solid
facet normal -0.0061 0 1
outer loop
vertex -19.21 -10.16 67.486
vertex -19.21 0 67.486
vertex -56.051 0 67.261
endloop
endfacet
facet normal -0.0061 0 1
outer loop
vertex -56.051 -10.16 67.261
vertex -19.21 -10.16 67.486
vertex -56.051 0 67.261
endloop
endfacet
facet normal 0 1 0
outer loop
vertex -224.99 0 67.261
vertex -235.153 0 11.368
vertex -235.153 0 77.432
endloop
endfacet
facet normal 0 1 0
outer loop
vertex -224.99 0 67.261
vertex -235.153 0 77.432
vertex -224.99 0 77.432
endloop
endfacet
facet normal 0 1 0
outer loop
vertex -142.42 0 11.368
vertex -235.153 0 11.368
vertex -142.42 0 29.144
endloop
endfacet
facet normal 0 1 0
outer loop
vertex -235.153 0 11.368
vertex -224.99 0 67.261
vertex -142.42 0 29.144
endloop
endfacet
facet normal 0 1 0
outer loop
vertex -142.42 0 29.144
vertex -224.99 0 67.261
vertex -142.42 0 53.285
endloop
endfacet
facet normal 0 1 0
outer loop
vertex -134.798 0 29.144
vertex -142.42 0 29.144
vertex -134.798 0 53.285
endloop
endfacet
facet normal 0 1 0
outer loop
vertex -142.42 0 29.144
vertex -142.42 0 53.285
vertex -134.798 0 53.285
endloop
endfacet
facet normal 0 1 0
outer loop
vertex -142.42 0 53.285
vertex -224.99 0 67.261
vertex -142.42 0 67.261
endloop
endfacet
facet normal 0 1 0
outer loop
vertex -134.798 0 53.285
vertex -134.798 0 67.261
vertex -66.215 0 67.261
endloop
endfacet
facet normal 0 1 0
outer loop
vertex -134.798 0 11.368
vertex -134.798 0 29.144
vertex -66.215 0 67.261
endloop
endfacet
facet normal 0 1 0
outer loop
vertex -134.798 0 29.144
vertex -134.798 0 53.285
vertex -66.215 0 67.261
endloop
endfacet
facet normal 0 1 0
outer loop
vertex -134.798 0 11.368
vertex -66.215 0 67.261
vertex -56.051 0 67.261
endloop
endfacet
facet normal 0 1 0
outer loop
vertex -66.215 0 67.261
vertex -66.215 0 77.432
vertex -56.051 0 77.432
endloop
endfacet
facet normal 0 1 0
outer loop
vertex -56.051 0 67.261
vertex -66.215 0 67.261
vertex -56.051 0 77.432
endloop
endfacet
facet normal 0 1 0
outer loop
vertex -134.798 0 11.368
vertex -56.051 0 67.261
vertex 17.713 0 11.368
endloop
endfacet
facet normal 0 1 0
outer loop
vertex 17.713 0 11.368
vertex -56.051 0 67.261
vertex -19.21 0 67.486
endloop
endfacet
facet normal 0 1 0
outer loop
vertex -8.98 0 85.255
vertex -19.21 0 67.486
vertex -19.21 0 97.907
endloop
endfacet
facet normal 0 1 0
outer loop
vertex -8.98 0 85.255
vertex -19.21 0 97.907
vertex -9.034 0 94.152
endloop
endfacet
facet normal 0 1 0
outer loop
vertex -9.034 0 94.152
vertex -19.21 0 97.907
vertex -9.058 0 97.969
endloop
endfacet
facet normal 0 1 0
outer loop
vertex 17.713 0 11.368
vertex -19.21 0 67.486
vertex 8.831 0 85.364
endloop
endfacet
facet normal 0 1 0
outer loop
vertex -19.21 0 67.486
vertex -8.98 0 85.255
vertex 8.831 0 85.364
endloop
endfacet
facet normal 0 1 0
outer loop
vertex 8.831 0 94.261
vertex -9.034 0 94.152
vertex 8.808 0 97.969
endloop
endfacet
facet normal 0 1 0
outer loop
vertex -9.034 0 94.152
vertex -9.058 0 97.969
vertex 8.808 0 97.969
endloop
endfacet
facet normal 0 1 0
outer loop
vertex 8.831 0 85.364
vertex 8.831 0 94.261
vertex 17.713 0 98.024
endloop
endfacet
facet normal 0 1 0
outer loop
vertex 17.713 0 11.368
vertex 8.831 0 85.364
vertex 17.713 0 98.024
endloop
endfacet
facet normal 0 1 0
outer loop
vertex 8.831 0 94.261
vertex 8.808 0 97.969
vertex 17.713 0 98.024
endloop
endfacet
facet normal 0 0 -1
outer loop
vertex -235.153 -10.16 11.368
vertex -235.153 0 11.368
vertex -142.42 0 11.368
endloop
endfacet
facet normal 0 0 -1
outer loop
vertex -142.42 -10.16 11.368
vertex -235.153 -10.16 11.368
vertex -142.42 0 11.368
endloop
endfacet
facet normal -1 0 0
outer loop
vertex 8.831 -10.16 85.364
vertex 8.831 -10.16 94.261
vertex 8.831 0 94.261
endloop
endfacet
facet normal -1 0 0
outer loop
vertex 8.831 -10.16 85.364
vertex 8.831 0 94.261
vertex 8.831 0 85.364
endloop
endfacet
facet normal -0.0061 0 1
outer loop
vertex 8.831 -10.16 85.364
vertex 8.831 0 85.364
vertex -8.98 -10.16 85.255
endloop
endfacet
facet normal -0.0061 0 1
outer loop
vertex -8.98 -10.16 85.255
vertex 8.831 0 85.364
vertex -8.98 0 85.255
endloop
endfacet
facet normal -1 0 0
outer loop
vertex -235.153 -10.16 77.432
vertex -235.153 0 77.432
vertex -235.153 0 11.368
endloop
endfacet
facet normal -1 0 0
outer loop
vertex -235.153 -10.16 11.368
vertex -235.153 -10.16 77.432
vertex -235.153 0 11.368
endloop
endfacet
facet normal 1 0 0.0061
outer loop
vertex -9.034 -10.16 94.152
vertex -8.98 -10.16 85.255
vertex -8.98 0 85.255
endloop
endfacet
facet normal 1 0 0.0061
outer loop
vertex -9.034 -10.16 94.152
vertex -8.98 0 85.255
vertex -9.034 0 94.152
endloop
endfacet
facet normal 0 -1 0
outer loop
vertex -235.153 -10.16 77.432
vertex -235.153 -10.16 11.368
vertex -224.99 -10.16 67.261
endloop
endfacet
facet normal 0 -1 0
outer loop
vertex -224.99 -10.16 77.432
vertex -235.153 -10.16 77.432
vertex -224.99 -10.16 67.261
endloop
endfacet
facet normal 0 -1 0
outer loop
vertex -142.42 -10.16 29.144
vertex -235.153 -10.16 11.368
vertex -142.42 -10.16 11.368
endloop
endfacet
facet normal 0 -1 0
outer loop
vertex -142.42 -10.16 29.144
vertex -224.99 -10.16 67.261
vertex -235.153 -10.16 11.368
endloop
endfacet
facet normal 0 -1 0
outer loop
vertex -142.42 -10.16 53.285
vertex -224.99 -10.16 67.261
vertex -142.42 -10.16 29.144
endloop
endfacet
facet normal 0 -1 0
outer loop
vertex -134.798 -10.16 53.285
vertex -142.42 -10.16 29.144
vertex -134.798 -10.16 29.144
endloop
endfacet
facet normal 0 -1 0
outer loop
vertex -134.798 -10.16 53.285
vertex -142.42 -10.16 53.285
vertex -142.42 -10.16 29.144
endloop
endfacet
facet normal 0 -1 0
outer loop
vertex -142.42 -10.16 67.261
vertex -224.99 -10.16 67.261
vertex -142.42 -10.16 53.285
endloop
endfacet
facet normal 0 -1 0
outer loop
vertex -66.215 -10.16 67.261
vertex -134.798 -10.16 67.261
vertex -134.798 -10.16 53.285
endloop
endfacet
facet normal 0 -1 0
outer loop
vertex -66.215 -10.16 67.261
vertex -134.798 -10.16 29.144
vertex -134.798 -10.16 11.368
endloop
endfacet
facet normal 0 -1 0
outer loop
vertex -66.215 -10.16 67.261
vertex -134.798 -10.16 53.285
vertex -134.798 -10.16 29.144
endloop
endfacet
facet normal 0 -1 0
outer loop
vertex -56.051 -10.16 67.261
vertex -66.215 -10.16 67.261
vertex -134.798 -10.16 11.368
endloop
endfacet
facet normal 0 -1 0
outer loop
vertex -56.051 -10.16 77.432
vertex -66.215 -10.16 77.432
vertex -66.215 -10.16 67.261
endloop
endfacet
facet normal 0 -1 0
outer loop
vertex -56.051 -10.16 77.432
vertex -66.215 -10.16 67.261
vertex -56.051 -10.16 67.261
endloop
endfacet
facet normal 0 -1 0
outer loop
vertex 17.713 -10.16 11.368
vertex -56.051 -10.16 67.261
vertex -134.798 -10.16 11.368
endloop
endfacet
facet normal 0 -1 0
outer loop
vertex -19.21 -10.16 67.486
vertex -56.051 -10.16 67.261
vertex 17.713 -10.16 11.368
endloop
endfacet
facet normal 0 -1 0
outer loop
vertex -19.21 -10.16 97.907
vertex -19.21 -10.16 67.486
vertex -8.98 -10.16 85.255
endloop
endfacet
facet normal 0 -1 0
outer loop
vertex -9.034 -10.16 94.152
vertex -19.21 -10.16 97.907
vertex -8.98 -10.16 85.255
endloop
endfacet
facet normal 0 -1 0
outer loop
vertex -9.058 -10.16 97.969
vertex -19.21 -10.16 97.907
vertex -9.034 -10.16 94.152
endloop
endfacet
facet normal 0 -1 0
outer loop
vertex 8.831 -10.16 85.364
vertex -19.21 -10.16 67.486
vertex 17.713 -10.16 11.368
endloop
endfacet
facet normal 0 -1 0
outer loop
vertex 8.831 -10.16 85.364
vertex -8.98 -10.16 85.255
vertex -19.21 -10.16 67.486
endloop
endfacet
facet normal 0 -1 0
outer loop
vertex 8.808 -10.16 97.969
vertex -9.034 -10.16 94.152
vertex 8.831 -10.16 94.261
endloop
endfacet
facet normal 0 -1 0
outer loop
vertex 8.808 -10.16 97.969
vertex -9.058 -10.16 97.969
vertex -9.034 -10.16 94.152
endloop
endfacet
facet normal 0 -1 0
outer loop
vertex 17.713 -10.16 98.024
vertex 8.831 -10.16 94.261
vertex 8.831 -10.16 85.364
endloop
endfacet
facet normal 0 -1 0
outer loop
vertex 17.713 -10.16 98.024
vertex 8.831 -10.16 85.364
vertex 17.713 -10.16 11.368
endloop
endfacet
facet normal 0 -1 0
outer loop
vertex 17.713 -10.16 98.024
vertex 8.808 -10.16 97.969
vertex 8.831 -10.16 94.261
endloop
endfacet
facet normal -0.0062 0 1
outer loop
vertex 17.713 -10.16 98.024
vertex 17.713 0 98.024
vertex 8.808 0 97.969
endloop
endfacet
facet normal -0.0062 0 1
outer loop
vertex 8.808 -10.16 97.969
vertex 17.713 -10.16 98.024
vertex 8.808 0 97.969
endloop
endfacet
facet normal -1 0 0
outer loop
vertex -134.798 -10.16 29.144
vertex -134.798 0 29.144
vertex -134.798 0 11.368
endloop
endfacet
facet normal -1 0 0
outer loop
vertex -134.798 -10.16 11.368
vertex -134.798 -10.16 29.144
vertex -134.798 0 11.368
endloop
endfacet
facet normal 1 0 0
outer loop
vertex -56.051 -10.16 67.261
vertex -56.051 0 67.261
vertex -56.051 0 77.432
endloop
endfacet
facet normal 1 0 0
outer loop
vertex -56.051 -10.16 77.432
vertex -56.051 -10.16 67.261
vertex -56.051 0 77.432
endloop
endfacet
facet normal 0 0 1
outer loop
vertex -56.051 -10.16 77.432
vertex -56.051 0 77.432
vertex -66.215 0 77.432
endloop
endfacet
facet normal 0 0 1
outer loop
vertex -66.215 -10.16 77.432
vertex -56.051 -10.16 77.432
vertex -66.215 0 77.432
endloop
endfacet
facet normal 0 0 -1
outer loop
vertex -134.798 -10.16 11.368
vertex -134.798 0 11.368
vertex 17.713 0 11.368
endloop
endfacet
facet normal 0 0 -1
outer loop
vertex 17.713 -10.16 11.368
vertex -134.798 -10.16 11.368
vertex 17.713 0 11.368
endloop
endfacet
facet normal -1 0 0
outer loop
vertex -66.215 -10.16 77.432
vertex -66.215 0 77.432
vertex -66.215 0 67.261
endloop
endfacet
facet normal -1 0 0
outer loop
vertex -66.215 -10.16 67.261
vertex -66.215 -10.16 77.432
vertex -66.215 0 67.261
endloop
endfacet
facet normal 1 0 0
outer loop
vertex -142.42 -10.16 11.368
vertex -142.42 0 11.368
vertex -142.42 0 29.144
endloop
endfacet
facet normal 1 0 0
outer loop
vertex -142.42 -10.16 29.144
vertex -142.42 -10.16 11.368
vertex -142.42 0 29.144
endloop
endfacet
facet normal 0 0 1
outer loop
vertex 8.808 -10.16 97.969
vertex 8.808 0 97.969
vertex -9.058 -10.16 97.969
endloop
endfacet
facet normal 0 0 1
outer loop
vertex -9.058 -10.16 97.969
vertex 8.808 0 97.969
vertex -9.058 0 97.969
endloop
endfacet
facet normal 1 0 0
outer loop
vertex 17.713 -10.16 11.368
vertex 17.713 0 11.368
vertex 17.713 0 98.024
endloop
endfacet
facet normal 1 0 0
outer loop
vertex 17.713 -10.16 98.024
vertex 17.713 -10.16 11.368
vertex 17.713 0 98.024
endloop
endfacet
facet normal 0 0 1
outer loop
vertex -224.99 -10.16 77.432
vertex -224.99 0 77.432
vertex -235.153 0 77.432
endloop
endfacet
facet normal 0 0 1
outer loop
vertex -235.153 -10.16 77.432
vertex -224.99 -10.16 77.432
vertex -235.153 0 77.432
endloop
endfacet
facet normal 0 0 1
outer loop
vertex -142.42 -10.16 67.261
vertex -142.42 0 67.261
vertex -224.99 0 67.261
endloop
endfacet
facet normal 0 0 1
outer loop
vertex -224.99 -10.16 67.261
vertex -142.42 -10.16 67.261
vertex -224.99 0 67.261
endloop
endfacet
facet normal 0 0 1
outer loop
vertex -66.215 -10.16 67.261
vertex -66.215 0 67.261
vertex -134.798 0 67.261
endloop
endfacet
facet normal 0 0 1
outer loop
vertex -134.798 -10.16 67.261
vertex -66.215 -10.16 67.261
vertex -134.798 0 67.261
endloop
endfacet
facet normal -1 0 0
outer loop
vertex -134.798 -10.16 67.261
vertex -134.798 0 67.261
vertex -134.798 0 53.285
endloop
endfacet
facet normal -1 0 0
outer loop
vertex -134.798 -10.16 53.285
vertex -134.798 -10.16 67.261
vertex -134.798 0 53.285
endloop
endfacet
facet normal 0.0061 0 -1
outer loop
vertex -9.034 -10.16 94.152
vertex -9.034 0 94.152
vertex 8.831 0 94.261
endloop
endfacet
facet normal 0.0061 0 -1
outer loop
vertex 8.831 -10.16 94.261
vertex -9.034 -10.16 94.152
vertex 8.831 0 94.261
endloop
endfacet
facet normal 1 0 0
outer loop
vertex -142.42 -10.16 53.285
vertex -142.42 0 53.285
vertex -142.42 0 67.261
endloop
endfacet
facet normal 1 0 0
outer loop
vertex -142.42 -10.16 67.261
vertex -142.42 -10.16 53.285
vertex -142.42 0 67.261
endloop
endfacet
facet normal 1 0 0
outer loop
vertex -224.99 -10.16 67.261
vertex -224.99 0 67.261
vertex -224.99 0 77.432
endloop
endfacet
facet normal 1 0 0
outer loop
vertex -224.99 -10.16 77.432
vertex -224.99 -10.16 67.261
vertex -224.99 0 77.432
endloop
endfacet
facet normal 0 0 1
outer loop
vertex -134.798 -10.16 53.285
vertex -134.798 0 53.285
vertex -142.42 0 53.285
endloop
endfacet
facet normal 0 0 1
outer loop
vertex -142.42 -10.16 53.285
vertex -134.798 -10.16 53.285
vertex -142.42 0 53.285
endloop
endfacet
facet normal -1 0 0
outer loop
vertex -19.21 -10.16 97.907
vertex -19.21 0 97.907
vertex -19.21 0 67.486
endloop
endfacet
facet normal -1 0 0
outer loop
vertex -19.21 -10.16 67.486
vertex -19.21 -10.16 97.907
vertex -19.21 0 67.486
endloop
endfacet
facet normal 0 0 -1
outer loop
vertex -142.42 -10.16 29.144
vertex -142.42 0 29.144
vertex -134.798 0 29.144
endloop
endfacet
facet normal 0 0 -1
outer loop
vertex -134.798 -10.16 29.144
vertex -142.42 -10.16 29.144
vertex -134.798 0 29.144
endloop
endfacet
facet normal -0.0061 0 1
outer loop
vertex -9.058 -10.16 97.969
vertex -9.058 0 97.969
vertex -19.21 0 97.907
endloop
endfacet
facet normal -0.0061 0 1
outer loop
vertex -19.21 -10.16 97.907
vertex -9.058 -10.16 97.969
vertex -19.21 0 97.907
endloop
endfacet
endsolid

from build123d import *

# Parameters (mm, degrees)
F1_DEPTH = 10.16


with BuildPart() as f1:
    # F0 (on Front) → F1 (new body)
    with BuildSketch(Plane.XZ):
        Polygon((-134.797797, 11.368327), (12.51955, 11.368327), (17.712758, 11.368327), (17.712758, 98.023848), (8.808348, 97.969344), (8.831047, 94.261023), (8.831047, 85.363727), (-8.979842, 85.254705), (-9.034301, 94.151668), (-9.057669, 97.969344), (-19.210024, 97.9072), (-19.210024, 67.486234), (-56.051124, 67.260727), (-56.051124, 77.432118), (-66.21471, 77.432118), (-66.21471, 67.260727), (-134.797797, 67.260727), (-134.797797, 53.284746), (-142.41989, 53.284746), (-142.41989, 67.260727), (-224.99001, 67.260727), (-224.99001, 77.432118), (-235.15287, 77.432118), (-235.15287, 11.368327), (-142.41989, 11.368327), (-142.41989, 29.144347), (-134.797797, 29.144347), align=None)
        Polygon((8.831047, 94.261023), (8.808348, 97.969344), (-9.057669, 97.969344), (-9.034301, 94.151668), align=None)
    extrude(amount=F1_DEPTH)


solid = f1.part
